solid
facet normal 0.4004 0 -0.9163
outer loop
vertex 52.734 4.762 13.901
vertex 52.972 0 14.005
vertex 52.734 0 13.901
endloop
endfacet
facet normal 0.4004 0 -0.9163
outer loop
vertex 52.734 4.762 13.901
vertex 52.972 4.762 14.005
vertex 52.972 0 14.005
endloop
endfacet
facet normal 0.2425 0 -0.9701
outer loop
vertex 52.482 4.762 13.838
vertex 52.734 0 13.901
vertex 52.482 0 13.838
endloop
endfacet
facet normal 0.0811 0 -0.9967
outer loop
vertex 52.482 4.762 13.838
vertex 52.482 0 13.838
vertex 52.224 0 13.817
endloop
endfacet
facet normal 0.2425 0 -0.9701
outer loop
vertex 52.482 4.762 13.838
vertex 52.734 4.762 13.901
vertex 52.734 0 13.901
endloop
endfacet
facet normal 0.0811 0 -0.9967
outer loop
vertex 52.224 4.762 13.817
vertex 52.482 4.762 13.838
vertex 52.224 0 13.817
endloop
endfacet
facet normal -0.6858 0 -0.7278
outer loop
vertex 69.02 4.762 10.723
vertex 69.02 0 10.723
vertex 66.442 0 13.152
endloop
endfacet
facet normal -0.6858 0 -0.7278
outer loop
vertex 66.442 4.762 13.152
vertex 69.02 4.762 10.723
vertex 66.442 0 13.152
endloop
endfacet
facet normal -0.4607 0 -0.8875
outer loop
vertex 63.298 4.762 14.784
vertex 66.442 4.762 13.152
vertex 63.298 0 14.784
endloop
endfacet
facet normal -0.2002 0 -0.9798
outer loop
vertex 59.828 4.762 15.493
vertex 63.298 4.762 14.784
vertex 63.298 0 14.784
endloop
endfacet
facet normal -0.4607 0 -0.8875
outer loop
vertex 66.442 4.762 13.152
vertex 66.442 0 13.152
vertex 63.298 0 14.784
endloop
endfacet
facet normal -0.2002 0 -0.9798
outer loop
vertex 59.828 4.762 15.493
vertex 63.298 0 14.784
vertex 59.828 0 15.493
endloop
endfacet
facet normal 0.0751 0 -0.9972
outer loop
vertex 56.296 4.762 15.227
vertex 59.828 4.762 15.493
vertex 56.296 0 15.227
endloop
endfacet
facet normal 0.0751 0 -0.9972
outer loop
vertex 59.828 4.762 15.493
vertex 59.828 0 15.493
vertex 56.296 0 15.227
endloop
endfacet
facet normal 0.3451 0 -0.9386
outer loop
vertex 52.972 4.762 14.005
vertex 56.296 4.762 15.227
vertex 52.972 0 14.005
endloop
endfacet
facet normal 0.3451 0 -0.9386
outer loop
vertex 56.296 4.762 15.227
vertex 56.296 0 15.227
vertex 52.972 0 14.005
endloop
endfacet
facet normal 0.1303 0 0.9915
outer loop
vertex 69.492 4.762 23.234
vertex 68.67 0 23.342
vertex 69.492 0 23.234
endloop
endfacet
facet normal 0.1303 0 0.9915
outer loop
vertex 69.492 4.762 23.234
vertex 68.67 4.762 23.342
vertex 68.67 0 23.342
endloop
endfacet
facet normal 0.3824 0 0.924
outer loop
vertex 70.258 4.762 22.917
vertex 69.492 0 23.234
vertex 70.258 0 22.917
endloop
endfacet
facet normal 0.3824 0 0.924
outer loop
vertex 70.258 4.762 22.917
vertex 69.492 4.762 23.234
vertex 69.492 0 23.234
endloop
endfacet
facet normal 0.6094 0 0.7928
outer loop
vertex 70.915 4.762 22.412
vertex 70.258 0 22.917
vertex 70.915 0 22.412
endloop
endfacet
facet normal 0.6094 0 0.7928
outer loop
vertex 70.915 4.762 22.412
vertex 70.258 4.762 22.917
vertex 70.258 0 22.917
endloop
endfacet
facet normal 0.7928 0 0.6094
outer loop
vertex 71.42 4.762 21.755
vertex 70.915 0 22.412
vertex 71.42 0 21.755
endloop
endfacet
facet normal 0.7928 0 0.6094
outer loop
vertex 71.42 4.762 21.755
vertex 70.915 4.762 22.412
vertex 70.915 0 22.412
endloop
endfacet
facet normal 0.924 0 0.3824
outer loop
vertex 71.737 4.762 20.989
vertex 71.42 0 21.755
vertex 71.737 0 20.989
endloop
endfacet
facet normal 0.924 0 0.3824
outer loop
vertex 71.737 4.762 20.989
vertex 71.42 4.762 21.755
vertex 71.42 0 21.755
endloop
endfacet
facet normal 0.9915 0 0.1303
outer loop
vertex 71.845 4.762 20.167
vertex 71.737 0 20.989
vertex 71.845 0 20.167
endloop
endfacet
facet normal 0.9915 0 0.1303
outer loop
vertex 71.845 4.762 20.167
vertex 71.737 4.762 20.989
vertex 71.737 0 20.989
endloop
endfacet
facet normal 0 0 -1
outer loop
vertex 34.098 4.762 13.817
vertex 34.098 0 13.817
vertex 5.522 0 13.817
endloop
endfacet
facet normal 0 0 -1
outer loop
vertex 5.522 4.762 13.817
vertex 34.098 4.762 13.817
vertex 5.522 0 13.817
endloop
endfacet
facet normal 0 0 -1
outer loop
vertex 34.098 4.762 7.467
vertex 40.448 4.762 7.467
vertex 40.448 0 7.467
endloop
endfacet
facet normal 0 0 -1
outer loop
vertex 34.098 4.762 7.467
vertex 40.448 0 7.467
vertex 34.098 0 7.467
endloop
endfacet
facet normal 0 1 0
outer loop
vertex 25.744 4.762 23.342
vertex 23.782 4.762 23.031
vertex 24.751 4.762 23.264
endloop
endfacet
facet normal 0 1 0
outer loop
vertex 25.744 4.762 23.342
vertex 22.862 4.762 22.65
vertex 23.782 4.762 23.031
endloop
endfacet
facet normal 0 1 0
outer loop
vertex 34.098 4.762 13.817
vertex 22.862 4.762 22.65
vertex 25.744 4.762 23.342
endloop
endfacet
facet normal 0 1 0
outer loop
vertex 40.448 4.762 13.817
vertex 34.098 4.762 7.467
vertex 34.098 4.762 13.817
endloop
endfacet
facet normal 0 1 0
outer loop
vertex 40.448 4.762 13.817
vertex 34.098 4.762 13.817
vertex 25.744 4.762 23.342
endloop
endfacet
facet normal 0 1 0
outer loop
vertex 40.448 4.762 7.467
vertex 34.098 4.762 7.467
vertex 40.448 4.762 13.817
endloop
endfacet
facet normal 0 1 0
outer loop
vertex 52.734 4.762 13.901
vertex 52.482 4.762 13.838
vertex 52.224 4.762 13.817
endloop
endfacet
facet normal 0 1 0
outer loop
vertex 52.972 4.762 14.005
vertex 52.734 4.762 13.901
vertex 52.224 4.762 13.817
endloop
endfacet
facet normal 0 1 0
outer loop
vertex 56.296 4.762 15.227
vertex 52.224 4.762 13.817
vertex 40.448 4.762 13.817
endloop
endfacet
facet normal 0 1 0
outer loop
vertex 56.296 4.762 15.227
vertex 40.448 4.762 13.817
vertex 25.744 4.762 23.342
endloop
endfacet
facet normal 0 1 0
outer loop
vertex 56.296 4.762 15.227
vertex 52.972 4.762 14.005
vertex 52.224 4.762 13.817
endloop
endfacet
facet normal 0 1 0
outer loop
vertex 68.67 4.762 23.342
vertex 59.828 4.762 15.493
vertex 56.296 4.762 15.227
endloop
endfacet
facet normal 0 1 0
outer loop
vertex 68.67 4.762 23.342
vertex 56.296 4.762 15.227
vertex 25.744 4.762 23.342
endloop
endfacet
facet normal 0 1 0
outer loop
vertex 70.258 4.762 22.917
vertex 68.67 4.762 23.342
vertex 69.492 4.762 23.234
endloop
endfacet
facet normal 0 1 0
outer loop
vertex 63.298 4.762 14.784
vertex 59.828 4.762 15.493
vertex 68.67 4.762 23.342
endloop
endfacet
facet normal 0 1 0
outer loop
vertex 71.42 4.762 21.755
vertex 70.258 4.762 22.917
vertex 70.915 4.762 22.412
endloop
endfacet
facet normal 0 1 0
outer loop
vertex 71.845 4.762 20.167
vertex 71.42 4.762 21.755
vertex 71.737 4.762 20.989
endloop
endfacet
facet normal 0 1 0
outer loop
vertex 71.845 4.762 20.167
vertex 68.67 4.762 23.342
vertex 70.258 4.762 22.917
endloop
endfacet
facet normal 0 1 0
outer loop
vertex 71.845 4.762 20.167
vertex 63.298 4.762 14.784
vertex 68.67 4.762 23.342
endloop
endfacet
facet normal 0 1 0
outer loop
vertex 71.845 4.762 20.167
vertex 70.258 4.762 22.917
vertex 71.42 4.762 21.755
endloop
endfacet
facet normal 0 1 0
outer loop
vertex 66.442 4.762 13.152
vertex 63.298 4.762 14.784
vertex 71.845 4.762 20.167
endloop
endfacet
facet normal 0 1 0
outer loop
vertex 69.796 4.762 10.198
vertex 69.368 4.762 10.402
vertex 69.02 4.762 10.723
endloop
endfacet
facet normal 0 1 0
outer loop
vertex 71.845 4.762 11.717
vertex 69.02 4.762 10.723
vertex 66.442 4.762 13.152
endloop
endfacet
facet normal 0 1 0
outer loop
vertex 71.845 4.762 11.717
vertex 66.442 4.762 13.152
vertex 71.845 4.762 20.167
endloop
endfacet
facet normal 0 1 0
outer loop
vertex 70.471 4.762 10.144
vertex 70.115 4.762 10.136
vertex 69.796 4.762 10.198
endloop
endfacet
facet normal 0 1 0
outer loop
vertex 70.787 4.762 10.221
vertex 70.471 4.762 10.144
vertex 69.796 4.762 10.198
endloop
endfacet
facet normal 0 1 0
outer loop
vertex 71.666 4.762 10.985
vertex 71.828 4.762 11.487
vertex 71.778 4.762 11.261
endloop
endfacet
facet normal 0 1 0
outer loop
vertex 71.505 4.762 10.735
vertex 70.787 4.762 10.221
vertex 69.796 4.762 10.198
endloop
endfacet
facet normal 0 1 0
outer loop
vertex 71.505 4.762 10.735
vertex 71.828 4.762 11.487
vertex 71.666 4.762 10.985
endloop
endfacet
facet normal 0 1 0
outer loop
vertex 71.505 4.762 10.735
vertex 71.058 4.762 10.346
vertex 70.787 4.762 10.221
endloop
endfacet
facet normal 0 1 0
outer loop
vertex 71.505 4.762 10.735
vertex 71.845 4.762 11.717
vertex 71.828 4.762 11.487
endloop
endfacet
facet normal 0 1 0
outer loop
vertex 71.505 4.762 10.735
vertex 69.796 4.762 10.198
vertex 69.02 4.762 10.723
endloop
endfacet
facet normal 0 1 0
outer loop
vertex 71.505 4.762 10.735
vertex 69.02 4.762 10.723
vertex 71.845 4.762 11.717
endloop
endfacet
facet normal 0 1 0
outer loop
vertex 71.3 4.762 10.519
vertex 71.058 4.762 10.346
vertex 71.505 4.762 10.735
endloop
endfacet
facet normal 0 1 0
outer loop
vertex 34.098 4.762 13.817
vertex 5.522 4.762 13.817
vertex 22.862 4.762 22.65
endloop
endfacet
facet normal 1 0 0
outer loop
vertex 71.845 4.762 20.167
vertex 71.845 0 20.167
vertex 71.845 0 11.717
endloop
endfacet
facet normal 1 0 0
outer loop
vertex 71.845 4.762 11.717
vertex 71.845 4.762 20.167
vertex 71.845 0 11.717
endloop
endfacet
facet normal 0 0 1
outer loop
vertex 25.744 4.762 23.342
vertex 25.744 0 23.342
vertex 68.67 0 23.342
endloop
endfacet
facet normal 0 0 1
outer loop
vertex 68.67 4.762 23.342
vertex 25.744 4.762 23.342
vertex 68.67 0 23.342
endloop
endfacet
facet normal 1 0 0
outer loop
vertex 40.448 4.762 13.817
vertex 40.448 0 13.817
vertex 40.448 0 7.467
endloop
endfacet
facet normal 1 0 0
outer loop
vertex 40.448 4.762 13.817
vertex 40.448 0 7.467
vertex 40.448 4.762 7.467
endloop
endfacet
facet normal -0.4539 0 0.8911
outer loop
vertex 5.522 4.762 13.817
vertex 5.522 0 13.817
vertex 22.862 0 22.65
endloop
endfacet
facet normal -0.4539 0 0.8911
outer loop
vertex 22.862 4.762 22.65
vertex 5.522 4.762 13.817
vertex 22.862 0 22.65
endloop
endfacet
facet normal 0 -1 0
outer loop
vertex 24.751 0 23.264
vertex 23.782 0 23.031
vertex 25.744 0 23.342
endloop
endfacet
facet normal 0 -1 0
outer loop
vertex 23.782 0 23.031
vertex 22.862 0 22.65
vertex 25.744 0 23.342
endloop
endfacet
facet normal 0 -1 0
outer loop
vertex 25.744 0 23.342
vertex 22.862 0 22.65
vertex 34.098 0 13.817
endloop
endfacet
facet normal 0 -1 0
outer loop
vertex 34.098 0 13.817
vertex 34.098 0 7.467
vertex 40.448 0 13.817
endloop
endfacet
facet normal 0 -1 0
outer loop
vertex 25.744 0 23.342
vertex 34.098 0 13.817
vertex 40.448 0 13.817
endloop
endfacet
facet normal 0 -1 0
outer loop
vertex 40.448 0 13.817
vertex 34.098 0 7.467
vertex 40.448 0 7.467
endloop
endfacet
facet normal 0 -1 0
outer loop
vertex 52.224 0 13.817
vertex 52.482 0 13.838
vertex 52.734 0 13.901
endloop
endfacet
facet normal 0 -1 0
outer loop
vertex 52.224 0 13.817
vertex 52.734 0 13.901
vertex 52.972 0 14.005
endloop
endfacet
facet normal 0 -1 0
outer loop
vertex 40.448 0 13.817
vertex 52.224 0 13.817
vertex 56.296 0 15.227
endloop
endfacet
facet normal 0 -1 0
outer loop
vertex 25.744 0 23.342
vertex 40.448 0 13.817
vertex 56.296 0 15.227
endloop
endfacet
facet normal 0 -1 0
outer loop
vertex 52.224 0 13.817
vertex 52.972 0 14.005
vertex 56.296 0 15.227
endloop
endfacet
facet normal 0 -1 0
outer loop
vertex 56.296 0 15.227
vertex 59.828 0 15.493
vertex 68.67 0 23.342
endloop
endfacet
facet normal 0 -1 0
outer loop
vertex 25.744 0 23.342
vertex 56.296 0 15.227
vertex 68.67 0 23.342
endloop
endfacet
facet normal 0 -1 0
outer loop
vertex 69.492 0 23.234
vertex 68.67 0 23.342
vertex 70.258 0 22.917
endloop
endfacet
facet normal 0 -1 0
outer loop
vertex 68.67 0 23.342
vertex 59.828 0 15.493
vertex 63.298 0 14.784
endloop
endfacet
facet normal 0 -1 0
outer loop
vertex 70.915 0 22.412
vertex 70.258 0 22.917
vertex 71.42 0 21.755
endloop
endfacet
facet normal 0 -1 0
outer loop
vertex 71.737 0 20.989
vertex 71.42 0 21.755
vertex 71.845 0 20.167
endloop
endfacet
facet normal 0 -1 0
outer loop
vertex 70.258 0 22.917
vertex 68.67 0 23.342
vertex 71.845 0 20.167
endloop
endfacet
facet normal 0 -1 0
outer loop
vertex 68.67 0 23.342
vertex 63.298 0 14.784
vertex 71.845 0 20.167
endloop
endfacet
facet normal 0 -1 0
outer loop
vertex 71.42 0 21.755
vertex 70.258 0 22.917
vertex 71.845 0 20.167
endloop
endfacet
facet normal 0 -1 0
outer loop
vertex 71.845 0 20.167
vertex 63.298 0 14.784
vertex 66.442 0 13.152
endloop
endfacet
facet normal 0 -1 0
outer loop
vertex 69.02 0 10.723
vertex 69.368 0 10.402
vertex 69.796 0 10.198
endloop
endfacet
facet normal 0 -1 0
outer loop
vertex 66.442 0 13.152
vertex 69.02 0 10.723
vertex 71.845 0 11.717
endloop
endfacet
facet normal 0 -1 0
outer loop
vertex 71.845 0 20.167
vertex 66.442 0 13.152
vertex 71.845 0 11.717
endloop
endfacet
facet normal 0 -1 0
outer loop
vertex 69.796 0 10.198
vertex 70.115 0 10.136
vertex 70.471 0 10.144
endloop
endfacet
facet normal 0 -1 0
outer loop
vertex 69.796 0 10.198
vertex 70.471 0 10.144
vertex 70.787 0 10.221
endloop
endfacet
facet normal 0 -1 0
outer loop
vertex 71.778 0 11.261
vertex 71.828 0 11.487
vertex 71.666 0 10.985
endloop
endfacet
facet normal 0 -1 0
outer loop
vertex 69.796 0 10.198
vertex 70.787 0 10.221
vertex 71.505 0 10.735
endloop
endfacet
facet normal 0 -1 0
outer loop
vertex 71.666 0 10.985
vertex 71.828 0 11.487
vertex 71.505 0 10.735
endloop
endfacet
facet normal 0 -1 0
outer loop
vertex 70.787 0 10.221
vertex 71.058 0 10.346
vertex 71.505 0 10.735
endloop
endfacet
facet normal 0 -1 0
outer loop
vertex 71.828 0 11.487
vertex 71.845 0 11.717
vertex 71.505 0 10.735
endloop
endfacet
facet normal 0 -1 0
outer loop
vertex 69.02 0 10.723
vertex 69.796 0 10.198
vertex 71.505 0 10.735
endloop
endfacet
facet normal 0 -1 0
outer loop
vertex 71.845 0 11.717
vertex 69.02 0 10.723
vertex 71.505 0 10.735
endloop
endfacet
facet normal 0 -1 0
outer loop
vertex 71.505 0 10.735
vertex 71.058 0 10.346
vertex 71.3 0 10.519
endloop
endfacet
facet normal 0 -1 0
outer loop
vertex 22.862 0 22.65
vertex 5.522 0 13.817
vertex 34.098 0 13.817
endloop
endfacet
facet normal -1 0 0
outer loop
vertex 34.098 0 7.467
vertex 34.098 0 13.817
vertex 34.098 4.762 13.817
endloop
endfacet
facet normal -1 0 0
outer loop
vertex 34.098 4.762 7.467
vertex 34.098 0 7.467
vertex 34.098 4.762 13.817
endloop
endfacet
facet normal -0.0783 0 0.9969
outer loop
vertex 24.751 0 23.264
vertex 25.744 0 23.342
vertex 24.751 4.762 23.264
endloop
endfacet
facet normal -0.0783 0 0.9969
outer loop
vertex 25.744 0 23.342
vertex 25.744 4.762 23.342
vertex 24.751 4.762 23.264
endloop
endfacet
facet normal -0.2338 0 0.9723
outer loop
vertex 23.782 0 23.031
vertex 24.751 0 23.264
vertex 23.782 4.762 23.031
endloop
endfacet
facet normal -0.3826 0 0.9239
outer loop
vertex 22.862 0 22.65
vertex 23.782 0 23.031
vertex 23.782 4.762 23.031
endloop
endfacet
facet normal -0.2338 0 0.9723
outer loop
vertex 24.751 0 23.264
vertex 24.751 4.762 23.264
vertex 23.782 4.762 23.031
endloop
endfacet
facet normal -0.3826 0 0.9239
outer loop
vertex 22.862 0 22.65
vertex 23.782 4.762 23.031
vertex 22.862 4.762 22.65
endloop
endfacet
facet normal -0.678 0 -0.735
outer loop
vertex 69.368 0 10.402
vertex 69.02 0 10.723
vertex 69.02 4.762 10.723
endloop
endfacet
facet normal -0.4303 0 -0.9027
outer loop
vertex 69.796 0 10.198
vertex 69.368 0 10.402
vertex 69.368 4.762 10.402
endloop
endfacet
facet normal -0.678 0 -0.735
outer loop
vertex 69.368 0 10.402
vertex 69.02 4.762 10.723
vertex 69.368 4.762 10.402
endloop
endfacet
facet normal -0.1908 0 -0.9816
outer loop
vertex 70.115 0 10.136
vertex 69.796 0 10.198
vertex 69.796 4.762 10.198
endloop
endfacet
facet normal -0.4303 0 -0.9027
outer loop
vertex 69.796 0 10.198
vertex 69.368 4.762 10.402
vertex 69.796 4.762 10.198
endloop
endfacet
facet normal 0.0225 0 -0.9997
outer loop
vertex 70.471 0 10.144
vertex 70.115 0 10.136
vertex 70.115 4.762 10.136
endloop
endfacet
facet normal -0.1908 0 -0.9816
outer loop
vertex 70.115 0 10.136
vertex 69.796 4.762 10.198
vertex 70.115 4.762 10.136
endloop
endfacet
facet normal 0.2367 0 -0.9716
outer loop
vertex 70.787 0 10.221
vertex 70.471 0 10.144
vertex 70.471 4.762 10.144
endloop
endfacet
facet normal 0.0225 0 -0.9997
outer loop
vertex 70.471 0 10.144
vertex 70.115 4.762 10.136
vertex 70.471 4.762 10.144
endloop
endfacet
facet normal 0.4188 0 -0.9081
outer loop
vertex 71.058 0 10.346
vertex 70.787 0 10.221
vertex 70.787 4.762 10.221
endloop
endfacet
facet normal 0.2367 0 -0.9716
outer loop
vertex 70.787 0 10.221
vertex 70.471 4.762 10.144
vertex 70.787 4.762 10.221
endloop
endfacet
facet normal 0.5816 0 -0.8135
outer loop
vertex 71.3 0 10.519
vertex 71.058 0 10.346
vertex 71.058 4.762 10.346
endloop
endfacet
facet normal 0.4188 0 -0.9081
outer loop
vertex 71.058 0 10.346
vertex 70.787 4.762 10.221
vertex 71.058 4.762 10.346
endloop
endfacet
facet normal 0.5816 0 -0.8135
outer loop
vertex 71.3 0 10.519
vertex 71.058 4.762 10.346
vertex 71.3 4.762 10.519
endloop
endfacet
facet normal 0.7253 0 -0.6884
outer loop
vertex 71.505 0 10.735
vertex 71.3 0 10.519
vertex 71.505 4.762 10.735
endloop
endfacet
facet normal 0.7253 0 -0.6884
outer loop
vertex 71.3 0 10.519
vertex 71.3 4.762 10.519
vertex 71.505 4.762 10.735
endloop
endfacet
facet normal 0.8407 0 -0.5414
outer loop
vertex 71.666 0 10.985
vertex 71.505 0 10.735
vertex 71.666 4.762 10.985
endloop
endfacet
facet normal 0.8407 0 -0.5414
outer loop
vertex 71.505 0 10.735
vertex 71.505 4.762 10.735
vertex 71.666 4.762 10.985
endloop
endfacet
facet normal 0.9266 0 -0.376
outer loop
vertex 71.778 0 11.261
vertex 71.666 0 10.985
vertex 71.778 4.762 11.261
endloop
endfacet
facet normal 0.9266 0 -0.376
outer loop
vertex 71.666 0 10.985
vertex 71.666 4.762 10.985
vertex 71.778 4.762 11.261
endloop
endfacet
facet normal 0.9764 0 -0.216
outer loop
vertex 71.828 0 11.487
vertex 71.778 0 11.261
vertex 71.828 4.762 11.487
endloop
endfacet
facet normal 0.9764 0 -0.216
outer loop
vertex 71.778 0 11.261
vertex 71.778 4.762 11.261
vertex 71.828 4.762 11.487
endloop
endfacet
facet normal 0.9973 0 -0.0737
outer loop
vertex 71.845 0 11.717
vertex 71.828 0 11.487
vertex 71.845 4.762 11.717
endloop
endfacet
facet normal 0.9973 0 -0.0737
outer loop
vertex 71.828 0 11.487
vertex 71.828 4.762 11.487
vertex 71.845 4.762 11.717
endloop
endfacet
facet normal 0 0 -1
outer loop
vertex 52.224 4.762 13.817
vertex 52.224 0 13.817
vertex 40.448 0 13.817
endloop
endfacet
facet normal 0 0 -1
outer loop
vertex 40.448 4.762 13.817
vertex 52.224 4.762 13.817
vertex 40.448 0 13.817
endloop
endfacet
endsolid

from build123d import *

# Parameters (mm, degrees)
BOSS_EXTRUDE1_DEPTH = 4.7625
FILLET1_R           = 1.5875
FILLET2_R           = 6.35
FILLET3_R           = 3.175
SKETCH6_W           = 6.35
SKETCH6_H           = 4.7625
BOSS_EXTRUDE2_DEPTH = 6.35


with BuildPart() as part:
    # Sketch1 → Boss-Extrude1 (new body)
    with BuildSketch(Plane(origin=(0, 0, 0), x_dir=(1, 0, 0), z_dir=(0, 1, 0))):
        with BuildLine():
            ThreePointArc((71.8451, -2.691968416), (65.44608311, -13.792101845), (52.633598926, -13.817168416))
            Line((52.633598926, -13.817168416), (5.5225, -13.817168416))
            Line((5.5225, -13.817168416), (24.2201, -23.342168416))
            Line((24.2201, -23.342168416), (71.8451, -23.342168416))
            Line((71.8451, -23.342168416), (71.8451, -2.691968416))
        make_face()
    extrude(amount=BOSS_EXTRUDE1_DEPTH)

    # Fillet1
    fillet1_edges = [part.edges().sort_by_distance(p)[0] for p in [
        (71.8451, 2.38125, 2.691968416),
        (52.633598926, 2.38125, 13.817168416),
    ]]
    fillet(fillet1_edges, radius=FILLET1_R)

    # Fillet2
    fillet2_edges = [part.edges().sort_by_distance(p)[0] for p in [
        (24.2201, 2.38125, 23.342168416),
    ]]
    fillet(fillet2_edges, radius=FILLET2_R)

    # Fillet3
    fillet3_edges = [part.edges().sort_by_distance(p)[0] for p in [
        (71.8451, 2.38125, 23.342168416),
    ]]
    fillet(fillet3_edges, radius=FILLET3_R)

    # Sketch6 → Boss-Extrude2 (add)
    with BuildSketch(Plane(origin=(0, 0, 13.817168416), x_dir=(-1, 0, 0), z_dir=(0, 0, -1))):
        with Locations((-37.2725, 2.38125)):
            Rectangle(SKETCH6_W, SKETCH6_H)
    extrude(amount=BOSS_EXTRUDE2_DEPTH)


solid = part.part
